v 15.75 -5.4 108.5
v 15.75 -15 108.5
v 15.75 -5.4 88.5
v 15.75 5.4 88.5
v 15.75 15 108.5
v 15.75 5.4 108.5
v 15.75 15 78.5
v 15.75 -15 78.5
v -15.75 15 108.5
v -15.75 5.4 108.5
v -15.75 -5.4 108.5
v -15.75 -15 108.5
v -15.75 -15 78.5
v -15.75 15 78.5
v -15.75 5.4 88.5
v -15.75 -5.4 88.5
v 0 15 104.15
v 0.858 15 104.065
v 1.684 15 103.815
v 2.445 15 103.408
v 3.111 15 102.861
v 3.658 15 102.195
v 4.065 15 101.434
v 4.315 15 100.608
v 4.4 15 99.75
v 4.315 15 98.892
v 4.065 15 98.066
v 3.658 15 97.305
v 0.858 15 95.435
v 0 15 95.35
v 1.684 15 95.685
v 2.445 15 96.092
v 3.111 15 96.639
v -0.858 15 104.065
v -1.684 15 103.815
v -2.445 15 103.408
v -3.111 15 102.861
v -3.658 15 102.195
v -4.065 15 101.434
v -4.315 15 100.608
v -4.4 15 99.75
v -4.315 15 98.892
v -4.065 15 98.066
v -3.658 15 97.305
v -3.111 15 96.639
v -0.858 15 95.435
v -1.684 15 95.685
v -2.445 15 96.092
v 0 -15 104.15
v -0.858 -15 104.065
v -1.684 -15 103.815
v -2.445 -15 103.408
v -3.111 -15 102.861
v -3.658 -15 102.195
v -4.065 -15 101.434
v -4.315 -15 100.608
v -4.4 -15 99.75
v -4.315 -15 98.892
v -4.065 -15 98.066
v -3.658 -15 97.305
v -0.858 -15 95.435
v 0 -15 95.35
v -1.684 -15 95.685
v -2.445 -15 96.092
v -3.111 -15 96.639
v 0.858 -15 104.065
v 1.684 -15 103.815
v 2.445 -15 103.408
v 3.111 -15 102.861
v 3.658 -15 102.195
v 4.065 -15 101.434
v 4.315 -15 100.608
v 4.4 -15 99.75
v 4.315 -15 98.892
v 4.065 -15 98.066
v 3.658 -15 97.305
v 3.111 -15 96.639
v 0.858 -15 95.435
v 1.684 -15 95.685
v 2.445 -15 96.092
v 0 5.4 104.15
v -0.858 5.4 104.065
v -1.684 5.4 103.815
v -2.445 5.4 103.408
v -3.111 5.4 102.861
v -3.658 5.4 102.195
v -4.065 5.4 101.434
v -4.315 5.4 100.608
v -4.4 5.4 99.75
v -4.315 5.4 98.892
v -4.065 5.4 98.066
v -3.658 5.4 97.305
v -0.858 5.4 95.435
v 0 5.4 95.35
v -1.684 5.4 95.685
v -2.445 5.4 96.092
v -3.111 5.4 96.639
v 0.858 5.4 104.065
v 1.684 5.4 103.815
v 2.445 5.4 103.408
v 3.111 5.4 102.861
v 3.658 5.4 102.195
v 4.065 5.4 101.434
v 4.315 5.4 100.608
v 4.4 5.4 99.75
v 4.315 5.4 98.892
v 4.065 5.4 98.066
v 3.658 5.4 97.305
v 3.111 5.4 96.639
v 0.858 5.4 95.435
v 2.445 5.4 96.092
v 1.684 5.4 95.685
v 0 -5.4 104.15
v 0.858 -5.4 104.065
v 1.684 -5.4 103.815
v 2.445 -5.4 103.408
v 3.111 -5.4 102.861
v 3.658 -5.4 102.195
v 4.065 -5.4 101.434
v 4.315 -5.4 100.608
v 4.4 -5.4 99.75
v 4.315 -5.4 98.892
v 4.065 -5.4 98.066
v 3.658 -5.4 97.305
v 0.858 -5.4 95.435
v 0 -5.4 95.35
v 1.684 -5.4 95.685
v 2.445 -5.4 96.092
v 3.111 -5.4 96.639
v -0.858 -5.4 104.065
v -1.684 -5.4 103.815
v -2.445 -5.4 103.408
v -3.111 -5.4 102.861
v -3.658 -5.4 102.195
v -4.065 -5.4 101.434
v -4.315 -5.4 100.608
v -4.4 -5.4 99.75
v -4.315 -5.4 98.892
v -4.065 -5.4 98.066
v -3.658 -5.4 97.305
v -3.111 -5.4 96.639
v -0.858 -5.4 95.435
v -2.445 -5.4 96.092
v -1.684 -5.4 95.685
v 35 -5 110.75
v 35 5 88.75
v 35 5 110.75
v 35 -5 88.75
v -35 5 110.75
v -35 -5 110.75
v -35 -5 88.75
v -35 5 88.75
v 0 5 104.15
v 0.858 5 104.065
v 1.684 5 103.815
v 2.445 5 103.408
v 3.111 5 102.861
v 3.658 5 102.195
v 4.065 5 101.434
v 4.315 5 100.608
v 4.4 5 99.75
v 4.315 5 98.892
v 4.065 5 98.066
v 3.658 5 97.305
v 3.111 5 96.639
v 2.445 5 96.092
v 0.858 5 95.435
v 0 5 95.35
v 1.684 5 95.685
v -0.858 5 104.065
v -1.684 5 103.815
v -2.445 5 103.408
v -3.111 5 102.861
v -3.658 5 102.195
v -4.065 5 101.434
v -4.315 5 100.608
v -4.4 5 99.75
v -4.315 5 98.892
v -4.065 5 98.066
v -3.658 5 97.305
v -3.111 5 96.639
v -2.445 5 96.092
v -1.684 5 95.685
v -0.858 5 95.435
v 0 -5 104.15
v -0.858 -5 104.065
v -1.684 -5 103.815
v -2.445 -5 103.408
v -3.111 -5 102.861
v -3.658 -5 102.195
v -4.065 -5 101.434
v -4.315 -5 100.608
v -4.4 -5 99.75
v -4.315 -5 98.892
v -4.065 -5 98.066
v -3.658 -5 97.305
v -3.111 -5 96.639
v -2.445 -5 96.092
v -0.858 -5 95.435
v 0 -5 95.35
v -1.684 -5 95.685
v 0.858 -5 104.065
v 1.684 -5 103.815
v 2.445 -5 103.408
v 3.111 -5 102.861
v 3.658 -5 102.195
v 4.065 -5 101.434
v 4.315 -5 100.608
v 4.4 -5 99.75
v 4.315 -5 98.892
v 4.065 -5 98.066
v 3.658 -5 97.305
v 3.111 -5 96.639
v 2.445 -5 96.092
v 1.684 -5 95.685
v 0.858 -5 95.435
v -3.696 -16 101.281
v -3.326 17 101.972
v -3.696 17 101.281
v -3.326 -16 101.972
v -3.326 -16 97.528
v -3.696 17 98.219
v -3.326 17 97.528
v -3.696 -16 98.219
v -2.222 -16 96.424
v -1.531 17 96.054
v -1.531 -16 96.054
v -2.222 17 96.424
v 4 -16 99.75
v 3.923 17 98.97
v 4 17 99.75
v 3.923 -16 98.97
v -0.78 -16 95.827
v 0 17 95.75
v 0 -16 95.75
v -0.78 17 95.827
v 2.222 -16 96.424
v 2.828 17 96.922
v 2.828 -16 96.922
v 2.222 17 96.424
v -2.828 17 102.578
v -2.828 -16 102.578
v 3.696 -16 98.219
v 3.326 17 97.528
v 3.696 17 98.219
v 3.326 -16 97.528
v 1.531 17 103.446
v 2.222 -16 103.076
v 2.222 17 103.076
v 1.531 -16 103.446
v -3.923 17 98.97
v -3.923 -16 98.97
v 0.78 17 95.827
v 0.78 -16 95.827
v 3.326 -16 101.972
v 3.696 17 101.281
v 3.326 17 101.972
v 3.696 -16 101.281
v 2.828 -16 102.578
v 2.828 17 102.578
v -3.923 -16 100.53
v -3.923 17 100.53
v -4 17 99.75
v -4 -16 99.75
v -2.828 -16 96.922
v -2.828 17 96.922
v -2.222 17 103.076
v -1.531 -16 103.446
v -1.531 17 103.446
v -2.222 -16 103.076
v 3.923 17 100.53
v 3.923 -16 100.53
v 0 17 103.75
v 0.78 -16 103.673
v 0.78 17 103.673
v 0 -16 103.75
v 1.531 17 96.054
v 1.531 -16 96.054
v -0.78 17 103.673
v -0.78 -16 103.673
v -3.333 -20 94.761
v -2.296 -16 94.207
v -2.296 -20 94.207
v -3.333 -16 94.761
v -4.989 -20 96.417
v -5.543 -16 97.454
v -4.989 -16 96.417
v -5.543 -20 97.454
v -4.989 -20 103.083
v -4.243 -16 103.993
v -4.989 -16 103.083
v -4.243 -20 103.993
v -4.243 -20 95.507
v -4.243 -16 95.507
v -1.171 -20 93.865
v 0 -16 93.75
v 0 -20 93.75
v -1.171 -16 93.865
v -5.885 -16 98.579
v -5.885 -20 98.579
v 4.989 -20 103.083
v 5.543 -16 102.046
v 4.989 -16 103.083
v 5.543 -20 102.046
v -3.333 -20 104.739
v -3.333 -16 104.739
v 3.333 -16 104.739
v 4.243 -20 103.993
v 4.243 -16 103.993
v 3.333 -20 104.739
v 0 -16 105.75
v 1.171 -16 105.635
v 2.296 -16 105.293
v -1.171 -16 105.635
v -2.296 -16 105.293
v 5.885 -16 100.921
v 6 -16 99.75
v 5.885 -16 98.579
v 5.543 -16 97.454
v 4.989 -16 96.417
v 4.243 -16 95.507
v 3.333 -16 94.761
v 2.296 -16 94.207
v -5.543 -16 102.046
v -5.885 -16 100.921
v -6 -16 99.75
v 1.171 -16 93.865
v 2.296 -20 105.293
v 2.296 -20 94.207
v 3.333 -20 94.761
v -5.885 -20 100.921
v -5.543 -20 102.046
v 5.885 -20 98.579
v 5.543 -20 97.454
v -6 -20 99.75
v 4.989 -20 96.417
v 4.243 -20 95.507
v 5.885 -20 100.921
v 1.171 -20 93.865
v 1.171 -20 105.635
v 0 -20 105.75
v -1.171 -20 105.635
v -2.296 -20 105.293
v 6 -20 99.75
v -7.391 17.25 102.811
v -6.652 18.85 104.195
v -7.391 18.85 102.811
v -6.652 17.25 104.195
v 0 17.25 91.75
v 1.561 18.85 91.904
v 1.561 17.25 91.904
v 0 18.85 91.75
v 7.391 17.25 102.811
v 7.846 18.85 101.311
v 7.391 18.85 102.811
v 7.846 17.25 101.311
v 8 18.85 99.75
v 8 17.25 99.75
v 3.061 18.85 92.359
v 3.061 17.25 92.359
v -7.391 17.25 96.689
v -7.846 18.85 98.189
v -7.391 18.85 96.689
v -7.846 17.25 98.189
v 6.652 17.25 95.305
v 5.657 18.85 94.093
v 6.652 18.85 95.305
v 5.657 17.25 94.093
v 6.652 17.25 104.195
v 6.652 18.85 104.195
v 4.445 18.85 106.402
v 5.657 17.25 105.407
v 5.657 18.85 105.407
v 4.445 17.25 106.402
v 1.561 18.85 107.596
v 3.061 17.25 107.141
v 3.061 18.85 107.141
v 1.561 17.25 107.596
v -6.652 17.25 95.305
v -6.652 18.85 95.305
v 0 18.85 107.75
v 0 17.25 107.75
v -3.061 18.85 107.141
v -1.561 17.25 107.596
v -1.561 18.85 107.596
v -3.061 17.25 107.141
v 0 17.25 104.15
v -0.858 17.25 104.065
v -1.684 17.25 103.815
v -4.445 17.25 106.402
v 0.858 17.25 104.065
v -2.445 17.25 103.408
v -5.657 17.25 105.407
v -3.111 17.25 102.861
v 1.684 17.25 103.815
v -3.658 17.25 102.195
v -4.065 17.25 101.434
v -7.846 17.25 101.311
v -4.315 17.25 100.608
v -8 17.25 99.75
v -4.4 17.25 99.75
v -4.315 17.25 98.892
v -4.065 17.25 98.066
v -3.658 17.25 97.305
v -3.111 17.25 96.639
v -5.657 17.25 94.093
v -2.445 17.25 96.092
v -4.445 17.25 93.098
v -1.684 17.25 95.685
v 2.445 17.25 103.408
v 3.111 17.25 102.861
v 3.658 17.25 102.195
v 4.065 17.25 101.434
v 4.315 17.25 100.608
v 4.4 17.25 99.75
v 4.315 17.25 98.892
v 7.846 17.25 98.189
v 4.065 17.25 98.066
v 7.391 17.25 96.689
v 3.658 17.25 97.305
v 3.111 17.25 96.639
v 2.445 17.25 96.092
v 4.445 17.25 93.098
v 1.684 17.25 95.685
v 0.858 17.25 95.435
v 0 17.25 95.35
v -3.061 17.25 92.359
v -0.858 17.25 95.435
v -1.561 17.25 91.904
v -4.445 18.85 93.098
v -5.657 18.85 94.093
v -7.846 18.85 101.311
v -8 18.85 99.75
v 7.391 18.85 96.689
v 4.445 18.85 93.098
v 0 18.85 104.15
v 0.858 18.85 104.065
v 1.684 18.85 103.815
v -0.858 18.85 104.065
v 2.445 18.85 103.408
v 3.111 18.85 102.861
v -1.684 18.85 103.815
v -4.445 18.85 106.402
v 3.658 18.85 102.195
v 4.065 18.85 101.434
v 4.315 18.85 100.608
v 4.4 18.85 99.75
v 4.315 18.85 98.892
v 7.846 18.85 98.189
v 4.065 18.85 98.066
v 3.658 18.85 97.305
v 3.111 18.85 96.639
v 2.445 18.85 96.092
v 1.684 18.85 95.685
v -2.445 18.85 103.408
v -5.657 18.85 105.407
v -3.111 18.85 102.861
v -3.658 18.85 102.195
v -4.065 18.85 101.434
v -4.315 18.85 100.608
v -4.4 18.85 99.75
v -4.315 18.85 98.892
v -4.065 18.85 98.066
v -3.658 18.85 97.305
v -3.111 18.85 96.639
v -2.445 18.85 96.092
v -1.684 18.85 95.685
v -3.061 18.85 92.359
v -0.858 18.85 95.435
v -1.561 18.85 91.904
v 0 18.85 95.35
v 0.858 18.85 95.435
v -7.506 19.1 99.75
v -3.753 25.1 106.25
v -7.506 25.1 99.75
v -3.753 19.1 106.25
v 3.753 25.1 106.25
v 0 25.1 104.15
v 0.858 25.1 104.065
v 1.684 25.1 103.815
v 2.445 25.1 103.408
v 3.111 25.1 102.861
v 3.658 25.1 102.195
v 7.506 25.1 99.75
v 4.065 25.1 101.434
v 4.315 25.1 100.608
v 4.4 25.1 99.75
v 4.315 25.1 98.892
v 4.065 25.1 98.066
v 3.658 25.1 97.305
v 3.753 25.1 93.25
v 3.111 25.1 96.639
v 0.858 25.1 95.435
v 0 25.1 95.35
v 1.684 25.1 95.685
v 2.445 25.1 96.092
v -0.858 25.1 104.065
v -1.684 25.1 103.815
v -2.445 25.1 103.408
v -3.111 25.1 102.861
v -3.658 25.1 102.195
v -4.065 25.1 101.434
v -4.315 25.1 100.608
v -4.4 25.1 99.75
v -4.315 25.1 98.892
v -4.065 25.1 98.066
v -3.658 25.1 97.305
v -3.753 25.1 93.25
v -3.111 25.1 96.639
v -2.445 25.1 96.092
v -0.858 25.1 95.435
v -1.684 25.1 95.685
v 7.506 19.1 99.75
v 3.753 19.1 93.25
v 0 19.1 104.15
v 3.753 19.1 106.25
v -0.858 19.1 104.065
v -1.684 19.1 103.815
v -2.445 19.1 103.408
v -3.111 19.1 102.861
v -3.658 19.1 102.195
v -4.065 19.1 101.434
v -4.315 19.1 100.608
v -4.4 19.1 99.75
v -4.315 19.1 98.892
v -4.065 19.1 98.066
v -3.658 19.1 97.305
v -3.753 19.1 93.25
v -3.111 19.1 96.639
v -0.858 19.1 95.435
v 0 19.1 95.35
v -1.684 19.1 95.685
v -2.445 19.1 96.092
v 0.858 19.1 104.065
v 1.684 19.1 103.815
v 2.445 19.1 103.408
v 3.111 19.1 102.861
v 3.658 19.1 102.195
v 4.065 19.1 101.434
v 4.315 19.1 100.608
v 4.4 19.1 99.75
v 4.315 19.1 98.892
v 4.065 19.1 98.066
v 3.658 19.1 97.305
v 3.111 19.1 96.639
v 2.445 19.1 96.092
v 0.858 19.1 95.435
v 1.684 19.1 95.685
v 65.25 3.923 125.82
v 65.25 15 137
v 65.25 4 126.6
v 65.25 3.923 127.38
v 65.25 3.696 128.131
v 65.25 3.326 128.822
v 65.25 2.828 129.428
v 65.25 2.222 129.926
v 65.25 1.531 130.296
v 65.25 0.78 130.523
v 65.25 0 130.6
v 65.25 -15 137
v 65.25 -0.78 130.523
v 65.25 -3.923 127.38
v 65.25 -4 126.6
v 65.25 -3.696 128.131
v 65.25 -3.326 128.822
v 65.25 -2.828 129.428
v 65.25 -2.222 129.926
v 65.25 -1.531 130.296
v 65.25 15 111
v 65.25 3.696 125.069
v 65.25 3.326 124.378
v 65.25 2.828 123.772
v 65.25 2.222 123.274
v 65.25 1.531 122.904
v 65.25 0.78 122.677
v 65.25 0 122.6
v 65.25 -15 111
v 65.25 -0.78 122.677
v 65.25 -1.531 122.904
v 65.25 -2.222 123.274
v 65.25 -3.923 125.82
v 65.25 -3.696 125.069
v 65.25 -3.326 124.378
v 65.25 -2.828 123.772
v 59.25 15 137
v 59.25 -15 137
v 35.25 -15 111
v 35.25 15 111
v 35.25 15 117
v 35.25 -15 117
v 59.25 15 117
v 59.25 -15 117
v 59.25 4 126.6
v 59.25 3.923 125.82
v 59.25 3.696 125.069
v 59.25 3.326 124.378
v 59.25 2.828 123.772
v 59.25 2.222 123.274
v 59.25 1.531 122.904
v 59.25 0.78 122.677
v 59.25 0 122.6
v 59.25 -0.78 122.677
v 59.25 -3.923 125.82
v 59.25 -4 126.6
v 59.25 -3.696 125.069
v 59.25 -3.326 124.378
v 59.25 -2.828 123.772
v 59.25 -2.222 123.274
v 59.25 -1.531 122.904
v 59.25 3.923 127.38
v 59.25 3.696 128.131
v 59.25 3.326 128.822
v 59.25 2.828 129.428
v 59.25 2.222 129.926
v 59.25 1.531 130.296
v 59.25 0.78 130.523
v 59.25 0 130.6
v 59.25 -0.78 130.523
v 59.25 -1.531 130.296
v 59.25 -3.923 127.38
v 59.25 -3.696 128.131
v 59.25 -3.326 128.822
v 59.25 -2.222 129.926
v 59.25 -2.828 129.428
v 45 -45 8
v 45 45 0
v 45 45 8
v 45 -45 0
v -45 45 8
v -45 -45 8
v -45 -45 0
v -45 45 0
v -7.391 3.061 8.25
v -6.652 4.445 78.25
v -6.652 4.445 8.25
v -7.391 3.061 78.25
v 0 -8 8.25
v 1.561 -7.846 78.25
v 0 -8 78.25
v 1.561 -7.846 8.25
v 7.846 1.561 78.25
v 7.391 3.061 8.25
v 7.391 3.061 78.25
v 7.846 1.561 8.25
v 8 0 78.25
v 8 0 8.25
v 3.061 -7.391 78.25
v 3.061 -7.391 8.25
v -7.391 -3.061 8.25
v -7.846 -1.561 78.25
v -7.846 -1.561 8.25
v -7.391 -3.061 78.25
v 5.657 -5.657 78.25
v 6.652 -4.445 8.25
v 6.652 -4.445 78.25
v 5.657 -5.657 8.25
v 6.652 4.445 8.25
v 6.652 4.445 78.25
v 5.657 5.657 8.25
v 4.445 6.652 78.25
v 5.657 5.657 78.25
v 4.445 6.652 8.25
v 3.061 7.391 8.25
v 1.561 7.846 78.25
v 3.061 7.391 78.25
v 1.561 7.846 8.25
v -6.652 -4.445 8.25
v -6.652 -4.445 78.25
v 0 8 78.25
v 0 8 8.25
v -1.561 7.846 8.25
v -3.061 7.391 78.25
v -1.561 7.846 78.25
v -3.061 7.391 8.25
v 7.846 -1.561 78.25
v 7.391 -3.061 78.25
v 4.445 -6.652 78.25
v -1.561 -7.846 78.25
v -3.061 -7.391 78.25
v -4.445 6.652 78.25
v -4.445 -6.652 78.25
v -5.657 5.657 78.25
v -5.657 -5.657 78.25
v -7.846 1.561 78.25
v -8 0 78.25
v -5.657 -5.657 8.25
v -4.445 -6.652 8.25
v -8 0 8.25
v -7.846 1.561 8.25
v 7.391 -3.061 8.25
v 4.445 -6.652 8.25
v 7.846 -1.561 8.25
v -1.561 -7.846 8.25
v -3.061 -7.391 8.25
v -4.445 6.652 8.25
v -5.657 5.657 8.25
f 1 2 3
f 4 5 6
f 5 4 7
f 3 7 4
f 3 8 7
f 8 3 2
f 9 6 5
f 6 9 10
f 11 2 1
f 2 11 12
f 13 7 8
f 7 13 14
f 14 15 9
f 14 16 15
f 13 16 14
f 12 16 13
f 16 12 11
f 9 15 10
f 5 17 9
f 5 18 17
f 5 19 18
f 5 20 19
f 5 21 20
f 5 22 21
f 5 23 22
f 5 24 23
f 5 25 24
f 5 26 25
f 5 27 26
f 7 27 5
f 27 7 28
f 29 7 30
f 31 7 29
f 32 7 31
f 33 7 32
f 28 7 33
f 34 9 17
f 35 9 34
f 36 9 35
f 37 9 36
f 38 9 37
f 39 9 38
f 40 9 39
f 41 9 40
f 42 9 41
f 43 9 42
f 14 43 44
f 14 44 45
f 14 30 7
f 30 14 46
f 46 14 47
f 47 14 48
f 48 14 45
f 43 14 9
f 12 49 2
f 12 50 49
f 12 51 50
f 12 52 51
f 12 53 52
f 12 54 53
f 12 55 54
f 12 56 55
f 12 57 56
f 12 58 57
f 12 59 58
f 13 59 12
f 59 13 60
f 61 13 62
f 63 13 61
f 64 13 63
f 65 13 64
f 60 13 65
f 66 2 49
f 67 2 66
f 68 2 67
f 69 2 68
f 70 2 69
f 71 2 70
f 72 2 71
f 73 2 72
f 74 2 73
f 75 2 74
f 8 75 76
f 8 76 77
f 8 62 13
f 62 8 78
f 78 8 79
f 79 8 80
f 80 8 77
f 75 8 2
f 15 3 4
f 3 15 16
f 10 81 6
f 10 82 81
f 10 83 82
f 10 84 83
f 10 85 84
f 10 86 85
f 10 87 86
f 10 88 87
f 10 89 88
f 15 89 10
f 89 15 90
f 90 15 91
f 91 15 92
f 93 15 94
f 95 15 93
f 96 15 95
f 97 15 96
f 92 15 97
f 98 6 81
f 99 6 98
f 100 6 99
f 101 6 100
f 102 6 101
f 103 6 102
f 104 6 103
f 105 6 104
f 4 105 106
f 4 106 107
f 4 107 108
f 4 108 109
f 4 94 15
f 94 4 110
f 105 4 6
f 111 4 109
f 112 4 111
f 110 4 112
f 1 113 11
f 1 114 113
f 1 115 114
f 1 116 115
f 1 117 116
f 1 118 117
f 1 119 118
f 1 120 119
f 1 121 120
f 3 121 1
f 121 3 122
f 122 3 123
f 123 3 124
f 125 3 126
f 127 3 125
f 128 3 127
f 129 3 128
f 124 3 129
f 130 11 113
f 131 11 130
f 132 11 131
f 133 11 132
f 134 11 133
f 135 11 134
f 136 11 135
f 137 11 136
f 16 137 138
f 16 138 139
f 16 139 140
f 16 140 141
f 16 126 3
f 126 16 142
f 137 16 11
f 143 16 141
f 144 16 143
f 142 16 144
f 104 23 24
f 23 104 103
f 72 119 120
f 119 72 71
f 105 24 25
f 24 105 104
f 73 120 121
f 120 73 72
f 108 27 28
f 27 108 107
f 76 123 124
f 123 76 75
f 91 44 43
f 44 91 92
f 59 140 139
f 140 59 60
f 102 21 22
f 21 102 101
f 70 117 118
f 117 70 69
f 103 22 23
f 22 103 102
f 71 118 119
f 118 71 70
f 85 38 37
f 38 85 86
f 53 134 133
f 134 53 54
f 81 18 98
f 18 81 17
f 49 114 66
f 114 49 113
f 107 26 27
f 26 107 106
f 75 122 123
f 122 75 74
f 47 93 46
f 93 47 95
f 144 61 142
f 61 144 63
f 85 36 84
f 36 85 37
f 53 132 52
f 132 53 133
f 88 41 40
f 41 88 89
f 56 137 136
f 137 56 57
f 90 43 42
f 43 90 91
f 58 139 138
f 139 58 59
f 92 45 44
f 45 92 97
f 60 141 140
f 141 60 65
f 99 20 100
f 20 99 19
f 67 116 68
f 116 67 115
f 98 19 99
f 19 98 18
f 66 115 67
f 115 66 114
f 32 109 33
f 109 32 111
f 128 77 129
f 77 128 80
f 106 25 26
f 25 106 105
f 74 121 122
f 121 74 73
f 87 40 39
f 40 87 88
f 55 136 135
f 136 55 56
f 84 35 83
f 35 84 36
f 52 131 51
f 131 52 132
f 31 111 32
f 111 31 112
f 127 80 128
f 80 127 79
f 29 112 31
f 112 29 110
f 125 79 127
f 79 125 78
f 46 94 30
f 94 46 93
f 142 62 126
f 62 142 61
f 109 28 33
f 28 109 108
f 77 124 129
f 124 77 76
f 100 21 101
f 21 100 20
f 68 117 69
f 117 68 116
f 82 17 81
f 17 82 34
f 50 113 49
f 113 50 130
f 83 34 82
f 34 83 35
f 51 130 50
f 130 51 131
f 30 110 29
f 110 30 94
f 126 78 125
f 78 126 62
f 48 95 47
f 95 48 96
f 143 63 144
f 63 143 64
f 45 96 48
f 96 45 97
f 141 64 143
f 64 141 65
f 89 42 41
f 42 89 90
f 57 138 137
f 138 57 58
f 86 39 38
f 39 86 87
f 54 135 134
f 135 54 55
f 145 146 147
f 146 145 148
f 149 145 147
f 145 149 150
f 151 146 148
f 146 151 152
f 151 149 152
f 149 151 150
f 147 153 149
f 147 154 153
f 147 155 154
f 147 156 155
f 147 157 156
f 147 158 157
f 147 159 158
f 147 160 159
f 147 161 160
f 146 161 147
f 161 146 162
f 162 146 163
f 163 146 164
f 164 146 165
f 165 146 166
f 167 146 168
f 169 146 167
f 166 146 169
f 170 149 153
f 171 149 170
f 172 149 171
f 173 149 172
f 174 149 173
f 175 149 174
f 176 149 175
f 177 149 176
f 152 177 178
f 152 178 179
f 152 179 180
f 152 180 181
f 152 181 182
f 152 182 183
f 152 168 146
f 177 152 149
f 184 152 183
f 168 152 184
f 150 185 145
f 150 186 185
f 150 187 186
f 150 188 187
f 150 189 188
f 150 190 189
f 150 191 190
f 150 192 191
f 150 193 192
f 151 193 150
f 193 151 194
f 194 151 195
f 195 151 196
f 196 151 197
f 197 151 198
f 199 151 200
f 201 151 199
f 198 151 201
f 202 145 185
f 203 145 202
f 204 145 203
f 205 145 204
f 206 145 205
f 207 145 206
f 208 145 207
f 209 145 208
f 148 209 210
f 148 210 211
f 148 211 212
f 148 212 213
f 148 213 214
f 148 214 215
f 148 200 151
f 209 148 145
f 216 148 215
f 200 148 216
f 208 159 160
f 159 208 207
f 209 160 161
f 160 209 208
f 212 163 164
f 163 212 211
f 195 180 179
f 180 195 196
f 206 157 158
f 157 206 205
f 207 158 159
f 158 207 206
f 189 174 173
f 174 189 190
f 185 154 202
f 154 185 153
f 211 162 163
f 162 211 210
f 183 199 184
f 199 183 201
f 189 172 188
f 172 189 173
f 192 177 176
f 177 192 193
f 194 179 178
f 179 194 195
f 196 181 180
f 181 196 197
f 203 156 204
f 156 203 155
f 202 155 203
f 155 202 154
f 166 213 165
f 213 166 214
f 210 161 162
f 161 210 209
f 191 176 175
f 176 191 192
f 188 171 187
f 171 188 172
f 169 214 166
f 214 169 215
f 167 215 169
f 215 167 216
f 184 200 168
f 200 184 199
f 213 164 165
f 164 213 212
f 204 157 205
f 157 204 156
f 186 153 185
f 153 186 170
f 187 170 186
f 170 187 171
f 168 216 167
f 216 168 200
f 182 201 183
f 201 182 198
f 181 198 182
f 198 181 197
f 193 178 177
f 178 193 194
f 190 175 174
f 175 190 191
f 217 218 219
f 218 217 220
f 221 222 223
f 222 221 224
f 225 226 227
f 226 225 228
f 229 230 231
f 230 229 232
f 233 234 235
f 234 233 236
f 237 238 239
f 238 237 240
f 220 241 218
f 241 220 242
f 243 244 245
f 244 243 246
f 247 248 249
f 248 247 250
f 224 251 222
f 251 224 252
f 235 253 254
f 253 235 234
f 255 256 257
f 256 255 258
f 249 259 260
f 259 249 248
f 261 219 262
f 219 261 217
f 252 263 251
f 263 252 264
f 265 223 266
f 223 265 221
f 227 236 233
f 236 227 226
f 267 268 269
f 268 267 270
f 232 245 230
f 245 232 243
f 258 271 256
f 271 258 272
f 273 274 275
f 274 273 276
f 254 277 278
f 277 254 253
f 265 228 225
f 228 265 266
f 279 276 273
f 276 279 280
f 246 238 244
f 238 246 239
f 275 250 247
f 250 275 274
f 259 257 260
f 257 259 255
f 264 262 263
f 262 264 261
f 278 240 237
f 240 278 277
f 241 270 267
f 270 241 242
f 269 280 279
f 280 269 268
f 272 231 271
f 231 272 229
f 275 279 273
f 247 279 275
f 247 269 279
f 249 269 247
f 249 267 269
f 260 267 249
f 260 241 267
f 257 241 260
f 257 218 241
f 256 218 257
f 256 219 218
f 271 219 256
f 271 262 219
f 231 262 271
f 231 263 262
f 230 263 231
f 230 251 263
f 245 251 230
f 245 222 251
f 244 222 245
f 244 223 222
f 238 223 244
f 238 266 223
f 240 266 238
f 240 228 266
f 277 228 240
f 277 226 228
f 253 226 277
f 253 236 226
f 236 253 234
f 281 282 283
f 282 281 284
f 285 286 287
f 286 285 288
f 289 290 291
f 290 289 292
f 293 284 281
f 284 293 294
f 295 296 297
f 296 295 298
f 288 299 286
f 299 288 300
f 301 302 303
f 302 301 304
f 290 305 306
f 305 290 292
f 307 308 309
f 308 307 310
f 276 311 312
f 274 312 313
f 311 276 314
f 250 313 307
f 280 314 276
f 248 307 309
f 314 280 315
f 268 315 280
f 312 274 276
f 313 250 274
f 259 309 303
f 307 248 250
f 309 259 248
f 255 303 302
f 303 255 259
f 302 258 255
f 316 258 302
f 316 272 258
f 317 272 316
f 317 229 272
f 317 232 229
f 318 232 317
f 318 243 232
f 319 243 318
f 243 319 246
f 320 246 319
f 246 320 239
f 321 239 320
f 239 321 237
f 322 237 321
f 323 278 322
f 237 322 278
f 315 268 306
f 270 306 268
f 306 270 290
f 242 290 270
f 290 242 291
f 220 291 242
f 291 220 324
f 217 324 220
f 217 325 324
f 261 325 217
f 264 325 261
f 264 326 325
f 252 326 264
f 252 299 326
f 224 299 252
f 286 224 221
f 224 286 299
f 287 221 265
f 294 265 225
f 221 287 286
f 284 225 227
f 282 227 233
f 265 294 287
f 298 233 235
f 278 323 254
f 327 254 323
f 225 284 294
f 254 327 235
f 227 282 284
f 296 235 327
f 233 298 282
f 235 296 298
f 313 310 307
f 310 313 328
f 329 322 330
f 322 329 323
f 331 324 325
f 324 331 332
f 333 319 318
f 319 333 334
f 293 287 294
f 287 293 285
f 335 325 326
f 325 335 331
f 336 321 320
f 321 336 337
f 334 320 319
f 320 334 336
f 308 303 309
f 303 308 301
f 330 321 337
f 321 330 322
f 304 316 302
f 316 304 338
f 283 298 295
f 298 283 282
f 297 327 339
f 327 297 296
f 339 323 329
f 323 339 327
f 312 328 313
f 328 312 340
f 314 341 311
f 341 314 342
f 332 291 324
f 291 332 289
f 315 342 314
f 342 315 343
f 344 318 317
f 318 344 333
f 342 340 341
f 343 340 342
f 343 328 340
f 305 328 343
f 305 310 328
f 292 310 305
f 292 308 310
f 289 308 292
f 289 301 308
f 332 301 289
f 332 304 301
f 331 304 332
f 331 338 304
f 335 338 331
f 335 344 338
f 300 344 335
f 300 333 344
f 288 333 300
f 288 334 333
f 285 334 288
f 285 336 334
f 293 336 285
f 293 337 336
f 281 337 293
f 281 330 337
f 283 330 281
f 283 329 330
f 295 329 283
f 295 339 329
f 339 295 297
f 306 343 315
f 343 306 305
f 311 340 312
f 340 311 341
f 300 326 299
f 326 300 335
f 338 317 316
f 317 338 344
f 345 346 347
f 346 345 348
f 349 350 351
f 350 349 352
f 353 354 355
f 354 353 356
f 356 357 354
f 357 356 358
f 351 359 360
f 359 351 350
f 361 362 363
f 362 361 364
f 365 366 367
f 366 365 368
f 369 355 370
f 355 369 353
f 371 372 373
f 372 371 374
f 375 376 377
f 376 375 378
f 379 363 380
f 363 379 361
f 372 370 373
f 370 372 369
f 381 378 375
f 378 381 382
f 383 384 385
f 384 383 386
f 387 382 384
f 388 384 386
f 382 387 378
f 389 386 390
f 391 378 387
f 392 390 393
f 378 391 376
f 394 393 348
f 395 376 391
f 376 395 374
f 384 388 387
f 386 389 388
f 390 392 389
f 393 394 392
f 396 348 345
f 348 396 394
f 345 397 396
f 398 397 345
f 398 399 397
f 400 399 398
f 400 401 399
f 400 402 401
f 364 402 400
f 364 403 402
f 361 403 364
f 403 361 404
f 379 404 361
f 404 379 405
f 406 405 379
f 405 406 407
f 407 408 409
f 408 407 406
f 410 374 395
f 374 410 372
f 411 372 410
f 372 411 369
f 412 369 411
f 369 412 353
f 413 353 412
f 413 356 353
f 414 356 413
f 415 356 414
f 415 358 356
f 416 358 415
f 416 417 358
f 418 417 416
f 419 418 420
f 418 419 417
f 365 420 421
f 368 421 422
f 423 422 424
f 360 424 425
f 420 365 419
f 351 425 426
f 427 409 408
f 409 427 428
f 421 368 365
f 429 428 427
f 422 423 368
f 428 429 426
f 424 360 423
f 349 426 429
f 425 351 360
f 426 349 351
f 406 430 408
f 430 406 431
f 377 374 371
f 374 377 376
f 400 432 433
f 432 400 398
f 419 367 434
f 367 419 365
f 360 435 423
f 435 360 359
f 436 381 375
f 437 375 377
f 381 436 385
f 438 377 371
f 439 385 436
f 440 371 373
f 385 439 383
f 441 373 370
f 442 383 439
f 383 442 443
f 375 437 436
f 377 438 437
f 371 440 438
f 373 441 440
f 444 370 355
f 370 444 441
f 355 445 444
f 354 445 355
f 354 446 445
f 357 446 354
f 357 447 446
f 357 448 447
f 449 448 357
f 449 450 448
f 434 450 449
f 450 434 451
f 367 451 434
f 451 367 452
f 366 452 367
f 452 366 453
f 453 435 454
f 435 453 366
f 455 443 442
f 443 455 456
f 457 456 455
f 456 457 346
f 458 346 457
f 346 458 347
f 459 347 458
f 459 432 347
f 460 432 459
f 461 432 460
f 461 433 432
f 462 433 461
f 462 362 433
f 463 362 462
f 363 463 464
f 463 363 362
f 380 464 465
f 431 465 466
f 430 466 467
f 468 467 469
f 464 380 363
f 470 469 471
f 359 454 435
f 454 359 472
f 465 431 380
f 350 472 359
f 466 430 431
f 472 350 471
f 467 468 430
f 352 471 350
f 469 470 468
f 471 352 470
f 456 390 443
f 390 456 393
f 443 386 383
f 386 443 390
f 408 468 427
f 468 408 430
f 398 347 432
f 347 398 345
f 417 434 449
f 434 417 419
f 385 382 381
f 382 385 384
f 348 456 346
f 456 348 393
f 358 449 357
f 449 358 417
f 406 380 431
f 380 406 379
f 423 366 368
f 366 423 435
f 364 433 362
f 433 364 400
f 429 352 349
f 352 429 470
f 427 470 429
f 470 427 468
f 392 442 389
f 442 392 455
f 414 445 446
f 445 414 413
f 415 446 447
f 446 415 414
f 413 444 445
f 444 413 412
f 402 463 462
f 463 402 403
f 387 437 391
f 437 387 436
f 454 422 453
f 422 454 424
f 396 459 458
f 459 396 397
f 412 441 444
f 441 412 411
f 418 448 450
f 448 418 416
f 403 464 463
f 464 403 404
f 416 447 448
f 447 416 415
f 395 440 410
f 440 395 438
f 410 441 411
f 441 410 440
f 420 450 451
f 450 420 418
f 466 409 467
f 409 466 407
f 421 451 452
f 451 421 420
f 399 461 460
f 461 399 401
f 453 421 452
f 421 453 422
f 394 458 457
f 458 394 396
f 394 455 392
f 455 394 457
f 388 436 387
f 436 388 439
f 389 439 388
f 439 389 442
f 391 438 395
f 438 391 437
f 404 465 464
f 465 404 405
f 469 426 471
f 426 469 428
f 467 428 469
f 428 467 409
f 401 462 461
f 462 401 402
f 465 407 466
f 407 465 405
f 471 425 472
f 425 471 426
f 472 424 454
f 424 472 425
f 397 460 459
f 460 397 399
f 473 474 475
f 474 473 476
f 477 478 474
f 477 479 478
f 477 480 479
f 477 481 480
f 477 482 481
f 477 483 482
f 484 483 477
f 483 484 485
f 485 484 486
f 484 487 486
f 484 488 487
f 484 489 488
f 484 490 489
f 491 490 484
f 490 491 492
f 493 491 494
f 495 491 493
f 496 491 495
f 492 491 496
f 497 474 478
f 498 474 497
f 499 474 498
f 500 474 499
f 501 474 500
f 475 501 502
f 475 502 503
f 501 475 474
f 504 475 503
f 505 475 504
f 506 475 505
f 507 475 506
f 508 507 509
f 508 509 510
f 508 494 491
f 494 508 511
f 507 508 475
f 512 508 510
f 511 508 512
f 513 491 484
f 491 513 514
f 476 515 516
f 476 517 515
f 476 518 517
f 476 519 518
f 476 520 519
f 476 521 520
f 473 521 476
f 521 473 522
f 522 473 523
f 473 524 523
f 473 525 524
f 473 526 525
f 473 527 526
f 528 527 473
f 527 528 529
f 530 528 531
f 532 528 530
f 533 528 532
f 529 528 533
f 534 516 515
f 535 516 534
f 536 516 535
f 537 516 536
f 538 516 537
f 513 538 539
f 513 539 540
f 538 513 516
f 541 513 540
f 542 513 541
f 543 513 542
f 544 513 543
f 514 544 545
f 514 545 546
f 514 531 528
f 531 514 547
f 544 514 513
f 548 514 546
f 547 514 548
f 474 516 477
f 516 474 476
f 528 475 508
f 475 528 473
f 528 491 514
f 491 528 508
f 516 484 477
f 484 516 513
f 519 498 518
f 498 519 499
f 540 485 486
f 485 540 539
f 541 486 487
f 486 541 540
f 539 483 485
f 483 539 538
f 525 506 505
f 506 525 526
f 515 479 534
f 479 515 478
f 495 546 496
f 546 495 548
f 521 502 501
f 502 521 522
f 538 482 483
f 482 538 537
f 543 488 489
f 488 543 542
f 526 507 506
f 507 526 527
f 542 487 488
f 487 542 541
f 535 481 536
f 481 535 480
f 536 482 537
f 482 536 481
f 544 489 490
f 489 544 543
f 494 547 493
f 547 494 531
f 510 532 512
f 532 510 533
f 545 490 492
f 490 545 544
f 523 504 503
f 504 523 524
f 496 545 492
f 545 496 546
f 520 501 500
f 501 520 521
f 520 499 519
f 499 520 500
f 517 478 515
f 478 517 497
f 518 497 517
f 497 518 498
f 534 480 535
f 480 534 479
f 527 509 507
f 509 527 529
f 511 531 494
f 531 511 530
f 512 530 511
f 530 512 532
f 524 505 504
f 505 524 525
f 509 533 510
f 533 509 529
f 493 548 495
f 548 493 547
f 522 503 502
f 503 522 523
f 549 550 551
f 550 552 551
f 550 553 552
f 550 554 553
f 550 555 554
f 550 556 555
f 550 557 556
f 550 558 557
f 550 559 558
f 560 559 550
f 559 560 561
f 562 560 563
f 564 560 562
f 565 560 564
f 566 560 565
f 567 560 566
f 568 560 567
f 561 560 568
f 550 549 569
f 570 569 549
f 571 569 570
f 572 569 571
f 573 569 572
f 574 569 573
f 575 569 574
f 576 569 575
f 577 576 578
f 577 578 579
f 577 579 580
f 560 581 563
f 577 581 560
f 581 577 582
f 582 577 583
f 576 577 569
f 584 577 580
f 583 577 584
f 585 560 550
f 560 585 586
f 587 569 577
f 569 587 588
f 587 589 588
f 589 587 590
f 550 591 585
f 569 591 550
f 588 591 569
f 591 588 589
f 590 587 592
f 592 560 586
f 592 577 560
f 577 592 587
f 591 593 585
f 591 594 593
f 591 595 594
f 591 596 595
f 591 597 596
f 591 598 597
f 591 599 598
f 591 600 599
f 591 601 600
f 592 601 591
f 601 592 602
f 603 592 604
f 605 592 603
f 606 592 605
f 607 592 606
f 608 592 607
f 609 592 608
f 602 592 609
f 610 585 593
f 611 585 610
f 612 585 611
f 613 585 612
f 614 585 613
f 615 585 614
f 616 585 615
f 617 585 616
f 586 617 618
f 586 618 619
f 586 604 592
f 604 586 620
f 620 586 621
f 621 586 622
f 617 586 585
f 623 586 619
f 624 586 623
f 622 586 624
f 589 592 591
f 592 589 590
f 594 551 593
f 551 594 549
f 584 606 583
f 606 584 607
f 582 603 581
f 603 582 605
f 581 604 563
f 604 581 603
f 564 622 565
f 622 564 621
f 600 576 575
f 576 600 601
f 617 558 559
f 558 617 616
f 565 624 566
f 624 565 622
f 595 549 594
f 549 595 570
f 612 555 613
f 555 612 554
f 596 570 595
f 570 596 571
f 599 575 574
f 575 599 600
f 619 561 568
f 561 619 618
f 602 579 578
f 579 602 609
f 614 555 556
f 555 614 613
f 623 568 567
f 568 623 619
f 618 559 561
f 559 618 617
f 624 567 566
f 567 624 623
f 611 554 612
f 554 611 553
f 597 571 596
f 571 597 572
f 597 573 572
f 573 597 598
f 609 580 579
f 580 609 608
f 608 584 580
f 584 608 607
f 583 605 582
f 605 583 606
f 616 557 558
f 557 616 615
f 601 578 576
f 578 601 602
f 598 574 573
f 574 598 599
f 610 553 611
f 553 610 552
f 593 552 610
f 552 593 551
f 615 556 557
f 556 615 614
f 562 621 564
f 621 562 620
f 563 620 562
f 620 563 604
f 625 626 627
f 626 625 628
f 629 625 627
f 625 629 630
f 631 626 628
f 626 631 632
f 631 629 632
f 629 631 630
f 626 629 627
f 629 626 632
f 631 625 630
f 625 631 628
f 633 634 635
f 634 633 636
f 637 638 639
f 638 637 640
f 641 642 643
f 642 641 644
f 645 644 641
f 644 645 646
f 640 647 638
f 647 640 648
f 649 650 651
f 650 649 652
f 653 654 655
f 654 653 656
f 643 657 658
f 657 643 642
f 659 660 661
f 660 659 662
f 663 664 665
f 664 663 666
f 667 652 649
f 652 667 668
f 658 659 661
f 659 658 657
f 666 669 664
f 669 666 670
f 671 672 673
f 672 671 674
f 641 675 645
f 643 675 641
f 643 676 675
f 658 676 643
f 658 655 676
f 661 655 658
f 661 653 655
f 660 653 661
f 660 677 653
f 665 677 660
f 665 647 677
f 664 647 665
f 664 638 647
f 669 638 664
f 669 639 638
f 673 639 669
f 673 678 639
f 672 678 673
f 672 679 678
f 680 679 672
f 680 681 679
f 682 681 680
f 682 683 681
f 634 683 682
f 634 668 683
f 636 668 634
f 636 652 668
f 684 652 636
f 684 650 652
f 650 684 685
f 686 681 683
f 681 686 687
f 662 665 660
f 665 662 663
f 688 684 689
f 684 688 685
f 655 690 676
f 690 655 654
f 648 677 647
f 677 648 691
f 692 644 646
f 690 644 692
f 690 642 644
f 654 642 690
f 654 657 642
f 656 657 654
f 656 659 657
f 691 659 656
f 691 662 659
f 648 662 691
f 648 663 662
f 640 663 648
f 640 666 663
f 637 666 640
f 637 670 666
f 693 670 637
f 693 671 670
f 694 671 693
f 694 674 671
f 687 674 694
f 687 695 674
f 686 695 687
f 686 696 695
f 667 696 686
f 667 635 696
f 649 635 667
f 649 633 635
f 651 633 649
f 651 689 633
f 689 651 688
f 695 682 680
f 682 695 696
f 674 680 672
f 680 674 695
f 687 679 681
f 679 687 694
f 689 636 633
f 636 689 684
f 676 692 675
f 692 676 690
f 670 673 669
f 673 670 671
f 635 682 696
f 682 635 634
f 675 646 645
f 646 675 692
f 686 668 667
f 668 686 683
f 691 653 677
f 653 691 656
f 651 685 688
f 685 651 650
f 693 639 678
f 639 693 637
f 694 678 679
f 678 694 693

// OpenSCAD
$fn = 32;

// ------------------------------------------------------------------------
// Lamp arm: column d16 x 70 mm, arm 70 mm
// Every part is its own module, assembly() places every instance.
// ------------------------------------------------------------------------

// --- part 1 ---
module lamp_base() {
  difference() {
    translate([-45, -45, 0]) cube([90, 90, 8]);
  }
}

// --- part 2 ---
module lamp_column() {
  cylinder(h = 70, d = 16);
}

// --- part 3 ---
module head_fork() {
  difference() {
    translate([-15.75, -15, 0]) cube([31.5, 30, 30]);
    translate([-16.75, -5.4, 10]) cube([33.5, 10.8, 21]);
    translate([0, 0, 21.25]) rotate([90, 0, 0]) cylinder(h = 32, d = 8.8, center = true);
  }
}

// --- part 4 ---
module lamp_arm() {
  difference() {
    translate([-35, -5, 0]) cube([70, 10, 22]);
    translate([0, 0, 11]) rotate([90, 0, 0]) cylinder(h = 12, d = 8.8, center = true);
  }
}

// --- part 5 ---
module arm_pin() {
  rotate([0, 90, 0]) cylinder(h = 34, d = 8, center = true);
  translate([-20, 0, 0]) rotate([0, 90, 0]) cylinder(h = 4, d = 12);
}

// --- part 6 ---
module arm_washer() {
  difference() {
      translate([0, 0, 0]) cylinder(h = 1.6, d = 16);
      translate([0, 0, -1]) cylinder(h = 3.6, d = 8.8);
    }
}

// --- part 7 ---
module arm_nut() {
  difference() {
    linear_extrude(height = 6) polygon(points = [[7.506, 0], [3.753, 6.5], [-3.753, 6.5], [-7.506, 0], [-3.753, -6.5], [3.753, -6.5]]);
    translate([0, 0, -1]) cylinder(h = 8, d = 8.8);
  }
}

// --- part 8 ---
module shade_bracket() {
  difference() {
    translate([-15, -15, 0]) cube([30, 30, 26]);
    translate([-16, -16, 6]) cube([25, 32, 21]);
    translate([12, 0, 15.6]) rotate([0, 90, 0]) cylinder(h = 8, d = 8, center = true);
  }
}

// --- assembly ---
module assembly() {
  color([0.80, 0.24, 0.20]) translate([0, 0, 0]) rotate([0, 0, 0]) lamp_base();
  color([0.20, 0.45, 0.75]) translate([0, 0, 8.25]) rotate([0, 0, 0]) lamp_column();
  color([0.25, 0.62, 0.32]) translate([0, 0, 78.5]) rotate([0, 0, 0]) head_fork();
  color([0.92, 0.70, 0.18]) translate([0, 0, 88.75]) rotate([0, 0, 0]) lamp_arm();
  color([0.58, 0.35, 0.70]) translate([0, 0, 99.75]) rotate([0, 0, 90]) arm_pin();
  color([0.16, 0.66, 0.66]) translate([0, 18.85, 99.75]) rotate([90, 0, 0]) arm_washer();
  color([0.85, 0.48, 0.18]) translate([0, 25.1, 99.75]) rotate([90, 0, 0]) arm_nut();
  color([0.55, 0.60, 0.65]) translate([50.25, 0, 111]) rotate([0, 0, 0]) shade_bracket();
}

assembly();
